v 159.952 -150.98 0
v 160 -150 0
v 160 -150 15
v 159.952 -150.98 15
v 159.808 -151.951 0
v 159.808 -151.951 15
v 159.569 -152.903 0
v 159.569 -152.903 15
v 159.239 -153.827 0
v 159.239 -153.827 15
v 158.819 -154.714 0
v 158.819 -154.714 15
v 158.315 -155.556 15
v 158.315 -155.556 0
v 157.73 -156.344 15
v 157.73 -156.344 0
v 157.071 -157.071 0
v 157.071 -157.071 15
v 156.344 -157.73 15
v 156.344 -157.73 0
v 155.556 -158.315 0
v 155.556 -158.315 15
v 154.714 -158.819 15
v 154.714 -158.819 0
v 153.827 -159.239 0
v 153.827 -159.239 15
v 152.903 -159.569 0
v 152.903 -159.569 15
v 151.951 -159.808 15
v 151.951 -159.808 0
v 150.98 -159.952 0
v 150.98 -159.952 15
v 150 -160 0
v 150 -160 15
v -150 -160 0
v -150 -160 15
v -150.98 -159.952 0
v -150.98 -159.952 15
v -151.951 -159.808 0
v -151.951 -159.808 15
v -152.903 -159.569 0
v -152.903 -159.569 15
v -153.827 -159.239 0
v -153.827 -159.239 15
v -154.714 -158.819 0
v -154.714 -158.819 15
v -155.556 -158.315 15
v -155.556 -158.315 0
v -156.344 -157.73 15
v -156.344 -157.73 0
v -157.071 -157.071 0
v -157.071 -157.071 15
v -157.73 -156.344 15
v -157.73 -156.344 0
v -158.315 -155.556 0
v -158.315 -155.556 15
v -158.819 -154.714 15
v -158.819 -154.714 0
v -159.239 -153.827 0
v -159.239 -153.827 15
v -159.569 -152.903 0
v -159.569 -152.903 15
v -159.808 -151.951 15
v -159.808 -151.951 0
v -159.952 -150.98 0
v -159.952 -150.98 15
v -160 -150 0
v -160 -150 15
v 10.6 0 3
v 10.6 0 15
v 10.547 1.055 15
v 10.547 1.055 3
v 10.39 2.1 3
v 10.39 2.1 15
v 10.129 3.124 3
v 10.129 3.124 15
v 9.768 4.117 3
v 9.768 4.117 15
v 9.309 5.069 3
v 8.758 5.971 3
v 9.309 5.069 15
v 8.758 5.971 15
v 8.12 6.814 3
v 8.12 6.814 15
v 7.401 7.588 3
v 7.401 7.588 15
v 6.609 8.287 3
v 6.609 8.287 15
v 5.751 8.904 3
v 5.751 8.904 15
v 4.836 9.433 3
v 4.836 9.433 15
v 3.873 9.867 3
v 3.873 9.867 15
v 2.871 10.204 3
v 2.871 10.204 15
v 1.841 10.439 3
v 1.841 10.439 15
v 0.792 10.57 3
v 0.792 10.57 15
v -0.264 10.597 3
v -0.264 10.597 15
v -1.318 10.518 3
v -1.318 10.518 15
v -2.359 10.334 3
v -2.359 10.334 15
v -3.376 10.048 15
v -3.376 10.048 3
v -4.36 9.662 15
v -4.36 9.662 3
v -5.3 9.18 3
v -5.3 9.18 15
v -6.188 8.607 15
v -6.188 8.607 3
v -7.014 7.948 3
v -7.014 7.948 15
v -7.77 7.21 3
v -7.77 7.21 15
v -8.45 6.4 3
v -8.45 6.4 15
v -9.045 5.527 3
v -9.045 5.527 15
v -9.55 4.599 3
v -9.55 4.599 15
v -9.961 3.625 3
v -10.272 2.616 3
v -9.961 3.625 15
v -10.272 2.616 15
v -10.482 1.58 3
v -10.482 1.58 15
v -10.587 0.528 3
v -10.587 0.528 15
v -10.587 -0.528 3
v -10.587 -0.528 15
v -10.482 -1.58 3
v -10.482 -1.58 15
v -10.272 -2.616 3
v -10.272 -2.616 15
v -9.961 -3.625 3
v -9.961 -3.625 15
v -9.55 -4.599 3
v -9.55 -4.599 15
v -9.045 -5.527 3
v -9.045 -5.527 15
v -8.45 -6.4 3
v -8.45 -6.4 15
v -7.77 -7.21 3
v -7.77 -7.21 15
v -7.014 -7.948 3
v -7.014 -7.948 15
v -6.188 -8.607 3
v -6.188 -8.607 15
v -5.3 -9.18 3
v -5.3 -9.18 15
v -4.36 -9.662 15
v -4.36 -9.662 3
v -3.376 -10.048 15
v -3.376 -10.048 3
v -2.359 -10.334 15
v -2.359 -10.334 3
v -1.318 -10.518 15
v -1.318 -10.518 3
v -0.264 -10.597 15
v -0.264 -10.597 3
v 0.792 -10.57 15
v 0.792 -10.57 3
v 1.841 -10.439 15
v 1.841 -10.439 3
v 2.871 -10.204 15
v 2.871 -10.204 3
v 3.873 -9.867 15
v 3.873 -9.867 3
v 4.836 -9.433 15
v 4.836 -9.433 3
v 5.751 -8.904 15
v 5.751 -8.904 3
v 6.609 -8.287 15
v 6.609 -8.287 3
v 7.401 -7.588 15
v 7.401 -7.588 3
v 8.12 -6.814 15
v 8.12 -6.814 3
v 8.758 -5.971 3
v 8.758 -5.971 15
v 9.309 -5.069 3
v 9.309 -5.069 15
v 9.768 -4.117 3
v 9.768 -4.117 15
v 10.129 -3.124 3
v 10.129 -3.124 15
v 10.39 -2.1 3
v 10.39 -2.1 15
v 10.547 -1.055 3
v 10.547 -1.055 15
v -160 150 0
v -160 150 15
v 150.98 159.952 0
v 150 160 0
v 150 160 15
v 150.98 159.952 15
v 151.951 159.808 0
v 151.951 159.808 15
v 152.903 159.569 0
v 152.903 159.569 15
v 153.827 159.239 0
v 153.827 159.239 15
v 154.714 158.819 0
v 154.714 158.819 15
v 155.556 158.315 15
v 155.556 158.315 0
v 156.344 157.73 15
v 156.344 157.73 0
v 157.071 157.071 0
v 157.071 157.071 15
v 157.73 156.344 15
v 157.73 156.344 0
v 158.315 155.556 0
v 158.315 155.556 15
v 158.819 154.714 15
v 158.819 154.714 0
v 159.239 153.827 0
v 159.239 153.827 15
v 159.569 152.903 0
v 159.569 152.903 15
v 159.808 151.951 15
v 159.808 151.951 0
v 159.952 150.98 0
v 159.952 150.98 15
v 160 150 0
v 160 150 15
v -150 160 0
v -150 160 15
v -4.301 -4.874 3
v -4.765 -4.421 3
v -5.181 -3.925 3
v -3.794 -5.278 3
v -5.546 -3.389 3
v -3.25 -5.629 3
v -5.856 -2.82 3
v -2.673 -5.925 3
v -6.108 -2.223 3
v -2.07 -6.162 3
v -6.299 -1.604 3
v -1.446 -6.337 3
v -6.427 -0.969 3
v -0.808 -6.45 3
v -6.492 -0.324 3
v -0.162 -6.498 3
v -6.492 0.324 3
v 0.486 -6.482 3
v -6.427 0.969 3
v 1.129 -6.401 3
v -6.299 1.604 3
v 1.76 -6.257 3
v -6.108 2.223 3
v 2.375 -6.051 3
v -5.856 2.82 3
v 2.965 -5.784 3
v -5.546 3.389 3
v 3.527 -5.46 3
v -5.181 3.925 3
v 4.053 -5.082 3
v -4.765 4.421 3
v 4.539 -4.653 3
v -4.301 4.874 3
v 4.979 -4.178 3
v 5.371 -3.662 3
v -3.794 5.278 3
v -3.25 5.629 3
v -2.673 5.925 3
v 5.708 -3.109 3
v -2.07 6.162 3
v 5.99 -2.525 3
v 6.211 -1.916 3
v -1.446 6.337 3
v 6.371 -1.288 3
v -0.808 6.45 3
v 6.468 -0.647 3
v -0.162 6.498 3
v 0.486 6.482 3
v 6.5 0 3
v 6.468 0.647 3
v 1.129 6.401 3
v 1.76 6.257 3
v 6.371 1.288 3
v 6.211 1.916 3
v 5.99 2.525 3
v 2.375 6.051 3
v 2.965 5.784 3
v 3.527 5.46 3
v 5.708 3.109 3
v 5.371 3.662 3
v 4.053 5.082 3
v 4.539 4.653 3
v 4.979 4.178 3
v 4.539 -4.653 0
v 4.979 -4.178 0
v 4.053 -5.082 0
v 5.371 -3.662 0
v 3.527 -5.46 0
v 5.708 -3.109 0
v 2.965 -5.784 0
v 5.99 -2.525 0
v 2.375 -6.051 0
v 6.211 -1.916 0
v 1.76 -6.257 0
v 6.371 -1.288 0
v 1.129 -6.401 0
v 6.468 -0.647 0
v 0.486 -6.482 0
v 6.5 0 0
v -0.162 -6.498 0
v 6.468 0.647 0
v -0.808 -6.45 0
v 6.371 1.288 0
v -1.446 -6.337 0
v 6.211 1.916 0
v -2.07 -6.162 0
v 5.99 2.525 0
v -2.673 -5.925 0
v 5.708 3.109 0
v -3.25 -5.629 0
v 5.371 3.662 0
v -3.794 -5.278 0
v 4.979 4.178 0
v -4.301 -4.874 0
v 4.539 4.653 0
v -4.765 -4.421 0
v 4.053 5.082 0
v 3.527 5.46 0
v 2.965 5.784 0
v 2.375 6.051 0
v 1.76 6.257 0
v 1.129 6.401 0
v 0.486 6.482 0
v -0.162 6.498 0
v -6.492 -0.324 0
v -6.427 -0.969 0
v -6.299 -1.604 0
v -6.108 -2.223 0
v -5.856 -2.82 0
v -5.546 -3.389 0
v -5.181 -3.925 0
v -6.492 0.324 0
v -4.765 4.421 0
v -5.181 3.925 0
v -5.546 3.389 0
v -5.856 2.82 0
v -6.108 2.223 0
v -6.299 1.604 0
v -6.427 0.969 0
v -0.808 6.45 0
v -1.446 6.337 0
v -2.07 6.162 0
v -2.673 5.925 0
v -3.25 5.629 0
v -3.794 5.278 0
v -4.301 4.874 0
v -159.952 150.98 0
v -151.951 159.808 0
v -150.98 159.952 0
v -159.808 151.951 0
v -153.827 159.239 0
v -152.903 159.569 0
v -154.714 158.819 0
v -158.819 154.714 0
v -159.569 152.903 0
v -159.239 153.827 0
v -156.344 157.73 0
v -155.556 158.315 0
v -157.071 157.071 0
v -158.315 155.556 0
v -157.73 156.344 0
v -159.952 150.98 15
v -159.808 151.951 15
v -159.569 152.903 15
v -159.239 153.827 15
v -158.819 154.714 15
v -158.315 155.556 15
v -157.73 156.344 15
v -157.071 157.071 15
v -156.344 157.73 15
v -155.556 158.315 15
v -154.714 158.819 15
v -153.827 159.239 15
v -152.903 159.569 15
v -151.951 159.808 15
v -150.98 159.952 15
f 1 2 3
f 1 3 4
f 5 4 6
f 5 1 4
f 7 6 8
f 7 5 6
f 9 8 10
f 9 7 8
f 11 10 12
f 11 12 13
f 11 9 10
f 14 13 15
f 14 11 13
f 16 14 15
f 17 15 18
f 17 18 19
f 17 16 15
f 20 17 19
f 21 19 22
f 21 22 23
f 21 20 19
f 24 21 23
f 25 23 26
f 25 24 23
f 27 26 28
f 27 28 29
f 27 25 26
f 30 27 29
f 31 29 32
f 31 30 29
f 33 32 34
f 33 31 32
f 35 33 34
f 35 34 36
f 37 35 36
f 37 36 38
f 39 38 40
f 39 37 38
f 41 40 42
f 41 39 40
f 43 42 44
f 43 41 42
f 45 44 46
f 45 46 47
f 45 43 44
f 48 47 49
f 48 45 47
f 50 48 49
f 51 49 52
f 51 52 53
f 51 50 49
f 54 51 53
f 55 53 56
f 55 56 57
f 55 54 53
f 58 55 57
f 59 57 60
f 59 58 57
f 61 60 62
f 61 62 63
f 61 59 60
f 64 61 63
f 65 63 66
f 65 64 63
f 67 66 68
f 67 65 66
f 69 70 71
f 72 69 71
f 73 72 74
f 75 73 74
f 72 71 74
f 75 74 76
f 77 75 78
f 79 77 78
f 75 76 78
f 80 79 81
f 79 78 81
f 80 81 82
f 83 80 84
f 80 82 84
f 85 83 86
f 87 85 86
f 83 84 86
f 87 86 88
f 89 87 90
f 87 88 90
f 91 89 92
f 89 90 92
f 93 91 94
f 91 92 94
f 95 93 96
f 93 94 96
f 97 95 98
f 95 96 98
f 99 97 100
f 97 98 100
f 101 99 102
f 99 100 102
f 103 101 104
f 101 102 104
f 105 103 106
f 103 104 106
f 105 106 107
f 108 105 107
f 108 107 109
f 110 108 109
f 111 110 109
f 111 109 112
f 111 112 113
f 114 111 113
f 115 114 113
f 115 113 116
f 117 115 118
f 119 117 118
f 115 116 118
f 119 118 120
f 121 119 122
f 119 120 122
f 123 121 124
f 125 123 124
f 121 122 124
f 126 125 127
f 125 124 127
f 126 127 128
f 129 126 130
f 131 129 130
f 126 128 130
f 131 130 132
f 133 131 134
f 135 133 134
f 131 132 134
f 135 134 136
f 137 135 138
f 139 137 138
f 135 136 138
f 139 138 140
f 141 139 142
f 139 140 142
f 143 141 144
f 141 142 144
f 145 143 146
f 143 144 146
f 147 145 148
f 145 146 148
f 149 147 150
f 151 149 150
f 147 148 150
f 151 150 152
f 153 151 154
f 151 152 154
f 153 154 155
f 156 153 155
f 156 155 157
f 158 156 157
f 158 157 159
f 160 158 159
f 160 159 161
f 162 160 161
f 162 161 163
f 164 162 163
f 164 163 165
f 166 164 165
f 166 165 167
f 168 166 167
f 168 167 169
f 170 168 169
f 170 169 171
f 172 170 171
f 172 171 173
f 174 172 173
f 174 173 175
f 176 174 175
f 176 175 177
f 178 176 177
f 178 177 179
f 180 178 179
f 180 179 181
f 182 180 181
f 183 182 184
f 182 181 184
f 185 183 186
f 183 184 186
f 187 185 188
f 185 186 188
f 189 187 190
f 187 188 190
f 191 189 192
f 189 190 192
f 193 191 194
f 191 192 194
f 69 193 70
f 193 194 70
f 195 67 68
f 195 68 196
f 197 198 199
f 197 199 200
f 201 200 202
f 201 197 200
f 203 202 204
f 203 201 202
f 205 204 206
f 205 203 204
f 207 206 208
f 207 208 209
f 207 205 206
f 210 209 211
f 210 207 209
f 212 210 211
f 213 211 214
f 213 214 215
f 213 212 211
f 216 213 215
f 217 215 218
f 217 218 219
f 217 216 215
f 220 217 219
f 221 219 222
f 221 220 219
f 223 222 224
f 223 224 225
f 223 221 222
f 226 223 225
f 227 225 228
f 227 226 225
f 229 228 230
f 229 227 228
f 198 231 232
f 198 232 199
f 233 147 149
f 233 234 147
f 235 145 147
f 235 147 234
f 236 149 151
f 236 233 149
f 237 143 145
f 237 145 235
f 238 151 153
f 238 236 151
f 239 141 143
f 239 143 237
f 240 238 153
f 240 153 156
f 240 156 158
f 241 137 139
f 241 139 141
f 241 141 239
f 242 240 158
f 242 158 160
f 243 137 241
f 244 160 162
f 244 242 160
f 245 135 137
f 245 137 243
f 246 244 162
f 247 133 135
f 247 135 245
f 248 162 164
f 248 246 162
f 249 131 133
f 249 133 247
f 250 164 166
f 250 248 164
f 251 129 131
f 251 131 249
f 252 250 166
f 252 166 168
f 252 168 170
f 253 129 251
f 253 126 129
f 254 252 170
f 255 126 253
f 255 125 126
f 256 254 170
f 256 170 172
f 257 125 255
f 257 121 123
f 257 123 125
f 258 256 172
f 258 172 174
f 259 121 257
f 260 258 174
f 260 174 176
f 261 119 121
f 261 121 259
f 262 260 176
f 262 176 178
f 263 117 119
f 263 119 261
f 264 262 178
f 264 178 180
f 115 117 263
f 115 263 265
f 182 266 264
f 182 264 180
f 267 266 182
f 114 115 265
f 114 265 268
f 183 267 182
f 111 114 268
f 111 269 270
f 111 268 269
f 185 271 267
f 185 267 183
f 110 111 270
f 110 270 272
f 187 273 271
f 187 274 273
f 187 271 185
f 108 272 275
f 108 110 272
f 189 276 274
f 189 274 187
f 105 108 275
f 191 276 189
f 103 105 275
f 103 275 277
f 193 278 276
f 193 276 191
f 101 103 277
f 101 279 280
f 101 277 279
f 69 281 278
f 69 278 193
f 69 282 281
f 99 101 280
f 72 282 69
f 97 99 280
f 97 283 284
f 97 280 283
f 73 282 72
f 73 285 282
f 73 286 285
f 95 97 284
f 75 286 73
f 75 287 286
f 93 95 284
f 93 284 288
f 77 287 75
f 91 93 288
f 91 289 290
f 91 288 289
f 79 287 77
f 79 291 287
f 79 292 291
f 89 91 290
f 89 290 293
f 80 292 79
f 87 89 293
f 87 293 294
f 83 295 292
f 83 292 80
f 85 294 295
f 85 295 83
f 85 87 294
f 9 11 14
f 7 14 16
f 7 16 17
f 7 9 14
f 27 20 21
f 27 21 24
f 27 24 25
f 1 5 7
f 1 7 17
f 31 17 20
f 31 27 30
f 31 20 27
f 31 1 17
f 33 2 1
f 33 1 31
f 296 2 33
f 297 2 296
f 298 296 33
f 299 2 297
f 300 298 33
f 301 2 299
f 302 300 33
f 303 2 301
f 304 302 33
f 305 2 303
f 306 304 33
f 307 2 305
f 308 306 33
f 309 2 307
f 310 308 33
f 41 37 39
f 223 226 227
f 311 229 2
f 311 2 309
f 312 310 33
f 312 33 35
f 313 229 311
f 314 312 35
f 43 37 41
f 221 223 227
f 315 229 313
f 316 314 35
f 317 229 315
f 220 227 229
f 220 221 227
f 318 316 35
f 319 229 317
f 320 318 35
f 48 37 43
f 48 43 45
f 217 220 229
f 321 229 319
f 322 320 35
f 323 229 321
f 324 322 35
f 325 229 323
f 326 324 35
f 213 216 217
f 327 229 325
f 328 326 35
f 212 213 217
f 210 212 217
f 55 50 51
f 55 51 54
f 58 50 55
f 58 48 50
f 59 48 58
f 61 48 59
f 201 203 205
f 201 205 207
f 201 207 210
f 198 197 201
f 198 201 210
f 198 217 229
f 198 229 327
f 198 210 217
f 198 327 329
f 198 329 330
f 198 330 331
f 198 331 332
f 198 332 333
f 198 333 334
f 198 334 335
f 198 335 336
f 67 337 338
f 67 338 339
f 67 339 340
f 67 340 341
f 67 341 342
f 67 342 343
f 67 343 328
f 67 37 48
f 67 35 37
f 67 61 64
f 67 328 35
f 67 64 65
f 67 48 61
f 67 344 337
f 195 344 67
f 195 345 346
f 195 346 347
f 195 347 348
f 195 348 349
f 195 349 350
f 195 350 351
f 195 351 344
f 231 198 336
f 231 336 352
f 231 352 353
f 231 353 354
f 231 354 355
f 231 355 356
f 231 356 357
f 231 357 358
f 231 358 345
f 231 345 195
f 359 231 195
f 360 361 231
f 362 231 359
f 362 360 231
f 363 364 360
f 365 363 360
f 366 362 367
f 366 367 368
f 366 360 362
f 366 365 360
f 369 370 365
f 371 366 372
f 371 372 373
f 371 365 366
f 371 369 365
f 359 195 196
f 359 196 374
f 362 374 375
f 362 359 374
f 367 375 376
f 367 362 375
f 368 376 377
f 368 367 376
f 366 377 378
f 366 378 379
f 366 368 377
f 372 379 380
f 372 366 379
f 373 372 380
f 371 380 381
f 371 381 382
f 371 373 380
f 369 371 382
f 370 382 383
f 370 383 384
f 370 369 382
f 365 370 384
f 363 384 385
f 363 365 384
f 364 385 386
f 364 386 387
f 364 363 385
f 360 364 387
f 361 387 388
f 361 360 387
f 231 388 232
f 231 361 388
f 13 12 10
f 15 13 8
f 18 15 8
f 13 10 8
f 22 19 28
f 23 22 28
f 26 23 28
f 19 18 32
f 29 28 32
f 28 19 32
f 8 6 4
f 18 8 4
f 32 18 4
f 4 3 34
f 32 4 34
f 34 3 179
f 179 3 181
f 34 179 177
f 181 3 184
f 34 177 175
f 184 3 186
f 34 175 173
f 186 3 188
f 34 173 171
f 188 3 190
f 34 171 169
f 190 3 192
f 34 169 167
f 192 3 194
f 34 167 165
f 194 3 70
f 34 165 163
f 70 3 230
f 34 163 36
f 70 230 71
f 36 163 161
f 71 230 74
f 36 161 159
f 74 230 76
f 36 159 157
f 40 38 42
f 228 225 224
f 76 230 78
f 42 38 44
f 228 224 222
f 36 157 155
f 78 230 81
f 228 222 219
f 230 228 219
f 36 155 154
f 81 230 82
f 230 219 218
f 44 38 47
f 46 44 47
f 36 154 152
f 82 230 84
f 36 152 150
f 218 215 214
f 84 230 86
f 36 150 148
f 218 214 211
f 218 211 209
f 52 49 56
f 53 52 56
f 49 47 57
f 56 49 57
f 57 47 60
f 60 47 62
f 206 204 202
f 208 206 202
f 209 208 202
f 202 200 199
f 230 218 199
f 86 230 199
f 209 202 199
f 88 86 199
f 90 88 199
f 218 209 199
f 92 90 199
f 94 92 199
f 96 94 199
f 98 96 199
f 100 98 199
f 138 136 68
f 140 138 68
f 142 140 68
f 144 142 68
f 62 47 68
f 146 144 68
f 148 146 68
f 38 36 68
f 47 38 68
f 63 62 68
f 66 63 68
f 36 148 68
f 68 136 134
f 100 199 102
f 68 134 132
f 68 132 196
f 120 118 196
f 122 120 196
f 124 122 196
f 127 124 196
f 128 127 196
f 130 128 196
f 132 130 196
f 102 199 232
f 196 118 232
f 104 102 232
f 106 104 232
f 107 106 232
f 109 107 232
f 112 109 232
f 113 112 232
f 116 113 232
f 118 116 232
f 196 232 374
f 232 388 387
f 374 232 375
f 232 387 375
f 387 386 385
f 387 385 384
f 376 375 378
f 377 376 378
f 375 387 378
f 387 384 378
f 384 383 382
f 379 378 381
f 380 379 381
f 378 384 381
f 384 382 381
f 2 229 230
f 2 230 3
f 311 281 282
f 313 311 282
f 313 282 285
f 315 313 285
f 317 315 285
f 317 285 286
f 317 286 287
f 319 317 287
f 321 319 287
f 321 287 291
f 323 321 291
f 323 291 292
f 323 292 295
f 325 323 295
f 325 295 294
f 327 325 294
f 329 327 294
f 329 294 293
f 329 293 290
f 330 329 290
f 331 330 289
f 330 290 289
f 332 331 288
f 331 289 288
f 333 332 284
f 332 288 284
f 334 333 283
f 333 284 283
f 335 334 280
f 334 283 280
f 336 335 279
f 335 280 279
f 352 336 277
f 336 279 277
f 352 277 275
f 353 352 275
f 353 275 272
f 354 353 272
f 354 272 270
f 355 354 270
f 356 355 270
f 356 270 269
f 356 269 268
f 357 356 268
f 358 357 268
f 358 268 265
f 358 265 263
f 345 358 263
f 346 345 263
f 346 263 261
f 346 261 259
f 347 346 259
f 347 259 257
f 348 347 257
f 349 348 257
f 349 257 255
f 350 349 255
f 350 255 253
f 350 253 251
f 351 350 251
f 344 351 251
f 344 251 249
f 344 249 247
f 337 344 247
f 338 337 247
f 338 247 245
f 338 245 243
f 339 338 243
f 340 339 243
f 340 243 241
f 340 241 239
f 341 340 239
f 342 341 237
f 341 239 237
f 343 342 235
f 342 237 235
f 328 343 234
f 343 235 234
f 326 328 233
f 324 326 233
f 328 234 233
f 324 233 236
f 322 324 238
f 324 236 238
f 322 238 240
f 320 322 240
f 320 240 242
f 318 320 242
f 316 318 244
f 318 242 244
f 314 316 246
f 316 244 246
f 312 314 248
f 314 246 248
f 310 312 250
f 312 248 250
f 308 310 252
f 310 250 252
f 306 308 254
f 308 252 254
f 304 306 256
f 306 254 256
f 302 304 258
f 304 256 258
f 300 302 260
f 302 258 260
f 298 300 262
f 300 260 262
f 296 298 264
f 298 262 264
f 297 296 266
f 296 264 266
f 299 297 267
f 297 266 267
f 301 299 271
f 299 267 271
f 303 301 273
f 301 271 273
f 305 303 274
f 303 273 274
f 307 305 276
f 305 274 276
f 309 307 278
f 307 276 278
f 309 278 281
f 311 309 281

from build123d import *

# Parameters (mm, degrees)
BOSS_EXTRUDE1_DEPTH = 15
SKETCH2_R           = 10.6
CUT_EXTRUDE1_DEPTH  = 12
SKETCH3_R           = 6.5
CUT_EXTRUDE2_DEPTH  = 10


with BuildPart() as part:
    # Sketch1 → Boss-Extrude1 (new body)
    with BuildSketch(Plane.XY):
        with BuildLine():
            Line((-150, 160), (150, 160))
            ThreePointArc((150, 160), (157.071067812, 157.071067812), (160, 150))
            Line((160, 150), (160, -150))
            ThreePointArc((160, -150), (157.071067812, -157.071067812), (150, -160))
            Line((150, -160), (-150, -160))
            ThreePointArc((-150, -160), (-157.071067812, -157.071067812), (-160, -150))
            Line((-160, -150), (-160, 150))
            ThreePointArc((-160, 150), (-157.071067812, 157.071067812), (-150, 160))
        make_face()
    extrude(amount=BOSS_EXTRUDE1_DEPTH)

    # Sketch2 → Cut-Extrude1 (cut)
    with BuildSketch(Plane.XY.offset(15)):
        Circle(SKETCH2_R)
    extrude(amount=-CUT_EXTRUDE1_DEPTH, mode=Mode.SUBTRACT)

    # Sketch3 → Cut-Extrude2 (cut)
    with BuildSketch(Plane.XY.offset(3)):
        Circle(SKETCH3_R)
    extrude(amount=-CUT_EXTRUDE2_DEPTH, mode=Mode.SUBTRACT)


solid = part.part
